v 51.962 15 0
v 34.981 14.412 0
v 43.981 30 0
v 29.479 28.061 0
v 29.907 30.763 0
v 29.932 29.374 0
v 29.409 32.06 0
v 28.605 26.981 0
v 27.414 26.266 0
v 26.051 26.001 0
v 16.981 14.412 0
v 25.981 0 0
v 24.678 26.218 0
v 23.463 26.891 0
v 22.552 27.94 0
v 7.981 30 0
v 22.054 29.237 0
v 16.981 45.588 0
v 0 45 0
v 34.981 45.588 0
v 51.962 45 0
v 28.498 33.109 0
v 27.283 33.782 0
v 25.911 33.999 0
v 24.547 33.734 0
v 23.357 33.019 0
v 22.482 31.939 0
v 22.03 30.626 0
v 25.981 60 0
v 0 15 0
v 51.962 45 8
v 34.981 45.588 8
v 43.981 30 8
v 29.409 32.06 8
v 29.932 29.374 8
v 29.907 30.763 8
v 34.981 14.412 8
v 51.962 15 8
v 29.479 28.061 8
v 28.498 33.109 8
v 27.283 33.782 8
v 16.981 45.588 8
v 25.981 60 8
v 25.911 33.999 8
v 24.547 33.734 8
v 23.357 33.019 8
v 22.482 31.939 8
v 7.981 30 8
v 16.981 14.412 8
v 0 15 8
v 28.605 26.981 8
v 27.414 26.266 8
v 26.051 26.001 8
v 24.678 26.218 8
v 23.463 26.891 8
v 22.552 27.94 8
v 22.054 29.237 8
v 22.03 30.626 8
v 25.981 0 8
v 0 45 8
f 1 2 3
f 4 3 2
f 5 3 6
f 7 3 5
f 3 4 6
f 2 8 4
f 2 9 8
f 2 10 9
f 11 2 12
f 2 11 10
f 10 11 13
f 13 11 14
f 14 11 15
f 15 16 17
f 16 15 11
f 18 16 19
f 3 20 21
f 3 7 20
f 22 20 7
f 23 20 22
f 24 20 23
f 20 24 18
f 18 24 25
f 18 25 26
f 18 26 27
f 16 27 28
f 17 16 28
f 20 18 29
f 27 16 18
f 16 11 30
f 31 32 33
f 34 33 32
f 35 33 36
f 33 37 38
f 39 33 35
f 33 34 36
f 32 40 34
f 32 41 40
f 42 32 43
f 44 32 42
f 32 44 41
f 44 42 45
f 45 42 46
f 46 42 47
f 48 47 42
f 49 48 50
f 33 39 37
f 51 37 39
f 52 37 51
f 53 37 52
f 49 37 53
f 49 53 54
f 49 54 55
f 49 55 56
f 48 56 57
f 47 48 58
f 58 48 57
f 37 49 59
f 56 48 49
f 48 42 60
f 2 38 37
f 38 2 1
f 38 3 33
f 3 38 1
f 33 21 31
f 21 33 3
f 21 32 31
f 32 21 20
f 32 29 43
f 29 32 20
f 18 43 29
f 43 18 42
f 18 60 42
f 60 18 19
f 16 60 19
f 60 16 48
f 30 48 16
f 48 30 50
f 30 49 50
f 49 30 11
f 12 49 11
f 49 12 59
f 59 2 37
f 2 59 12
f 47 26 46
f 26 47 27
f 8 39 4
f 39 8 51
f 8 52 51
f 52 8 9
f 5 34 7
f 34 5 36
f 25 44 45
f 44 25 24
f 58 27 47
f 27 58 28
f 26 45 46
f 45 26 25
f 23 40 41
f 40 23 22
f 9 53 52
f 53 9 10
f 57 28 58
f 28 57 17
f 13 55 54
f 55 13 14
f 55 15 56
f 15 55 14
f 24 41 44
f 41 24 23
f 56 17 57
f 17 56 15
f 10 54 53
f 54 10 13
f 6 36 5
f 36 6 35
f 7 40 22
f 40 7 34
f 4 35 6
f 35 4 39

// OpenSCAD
$fn = 32;

// ----------------------------------------------------------------------
// Star wheel: 6-point blunt, R30
// ----------------------------------------------------------------------

// --- parameters (mm) ---
n_points = 6;             // number of points / teeth
r_out = 30;               // tip radius
r_in = 18;                // root radius
bore_r = 4;               // centre bore radius
plate_t = 8;              // plate thickness, Z (extrusion height)
bore_d = 8;               // centre bore diameter

profile = [[25.981, 60], [16.981, 45.588], [0, 45], [7.981, 30], [0, 15], [16.981, 14.412], [25.981, 0], [34.981, 14.412], [51.962, 15], [43.981, 30], [51.962, 45], [34.981, 45.588]];  // primary outline, 12 points, counter clockwise
void_1 = [[29.907, 30.763], [29.409, 32.06], [28.498, 33.109], [27.283, 33.782], [25.911, 33.999], [24.547, 33.734], [23.357, 33.019], [22.482, 31.939], [22.03, 30.626], [22.054, 29.237], [22.552, 27.94], [23.463, 26.891], [24.678, 26.218], [26.051, 26.001], [27.414, 26.266], [28.605, 26.981], [29.479, 28.061], [29.932, 29.374]];  // centre bore, 18 points

// --- the one profile operation ---
difference() {
  linear_extrude(height = plate_t) polygon(points = profile);
  translate([0, 0, -1])
    linear_extrude(height = plate_t + 2) polygon(points = void_1);
}
